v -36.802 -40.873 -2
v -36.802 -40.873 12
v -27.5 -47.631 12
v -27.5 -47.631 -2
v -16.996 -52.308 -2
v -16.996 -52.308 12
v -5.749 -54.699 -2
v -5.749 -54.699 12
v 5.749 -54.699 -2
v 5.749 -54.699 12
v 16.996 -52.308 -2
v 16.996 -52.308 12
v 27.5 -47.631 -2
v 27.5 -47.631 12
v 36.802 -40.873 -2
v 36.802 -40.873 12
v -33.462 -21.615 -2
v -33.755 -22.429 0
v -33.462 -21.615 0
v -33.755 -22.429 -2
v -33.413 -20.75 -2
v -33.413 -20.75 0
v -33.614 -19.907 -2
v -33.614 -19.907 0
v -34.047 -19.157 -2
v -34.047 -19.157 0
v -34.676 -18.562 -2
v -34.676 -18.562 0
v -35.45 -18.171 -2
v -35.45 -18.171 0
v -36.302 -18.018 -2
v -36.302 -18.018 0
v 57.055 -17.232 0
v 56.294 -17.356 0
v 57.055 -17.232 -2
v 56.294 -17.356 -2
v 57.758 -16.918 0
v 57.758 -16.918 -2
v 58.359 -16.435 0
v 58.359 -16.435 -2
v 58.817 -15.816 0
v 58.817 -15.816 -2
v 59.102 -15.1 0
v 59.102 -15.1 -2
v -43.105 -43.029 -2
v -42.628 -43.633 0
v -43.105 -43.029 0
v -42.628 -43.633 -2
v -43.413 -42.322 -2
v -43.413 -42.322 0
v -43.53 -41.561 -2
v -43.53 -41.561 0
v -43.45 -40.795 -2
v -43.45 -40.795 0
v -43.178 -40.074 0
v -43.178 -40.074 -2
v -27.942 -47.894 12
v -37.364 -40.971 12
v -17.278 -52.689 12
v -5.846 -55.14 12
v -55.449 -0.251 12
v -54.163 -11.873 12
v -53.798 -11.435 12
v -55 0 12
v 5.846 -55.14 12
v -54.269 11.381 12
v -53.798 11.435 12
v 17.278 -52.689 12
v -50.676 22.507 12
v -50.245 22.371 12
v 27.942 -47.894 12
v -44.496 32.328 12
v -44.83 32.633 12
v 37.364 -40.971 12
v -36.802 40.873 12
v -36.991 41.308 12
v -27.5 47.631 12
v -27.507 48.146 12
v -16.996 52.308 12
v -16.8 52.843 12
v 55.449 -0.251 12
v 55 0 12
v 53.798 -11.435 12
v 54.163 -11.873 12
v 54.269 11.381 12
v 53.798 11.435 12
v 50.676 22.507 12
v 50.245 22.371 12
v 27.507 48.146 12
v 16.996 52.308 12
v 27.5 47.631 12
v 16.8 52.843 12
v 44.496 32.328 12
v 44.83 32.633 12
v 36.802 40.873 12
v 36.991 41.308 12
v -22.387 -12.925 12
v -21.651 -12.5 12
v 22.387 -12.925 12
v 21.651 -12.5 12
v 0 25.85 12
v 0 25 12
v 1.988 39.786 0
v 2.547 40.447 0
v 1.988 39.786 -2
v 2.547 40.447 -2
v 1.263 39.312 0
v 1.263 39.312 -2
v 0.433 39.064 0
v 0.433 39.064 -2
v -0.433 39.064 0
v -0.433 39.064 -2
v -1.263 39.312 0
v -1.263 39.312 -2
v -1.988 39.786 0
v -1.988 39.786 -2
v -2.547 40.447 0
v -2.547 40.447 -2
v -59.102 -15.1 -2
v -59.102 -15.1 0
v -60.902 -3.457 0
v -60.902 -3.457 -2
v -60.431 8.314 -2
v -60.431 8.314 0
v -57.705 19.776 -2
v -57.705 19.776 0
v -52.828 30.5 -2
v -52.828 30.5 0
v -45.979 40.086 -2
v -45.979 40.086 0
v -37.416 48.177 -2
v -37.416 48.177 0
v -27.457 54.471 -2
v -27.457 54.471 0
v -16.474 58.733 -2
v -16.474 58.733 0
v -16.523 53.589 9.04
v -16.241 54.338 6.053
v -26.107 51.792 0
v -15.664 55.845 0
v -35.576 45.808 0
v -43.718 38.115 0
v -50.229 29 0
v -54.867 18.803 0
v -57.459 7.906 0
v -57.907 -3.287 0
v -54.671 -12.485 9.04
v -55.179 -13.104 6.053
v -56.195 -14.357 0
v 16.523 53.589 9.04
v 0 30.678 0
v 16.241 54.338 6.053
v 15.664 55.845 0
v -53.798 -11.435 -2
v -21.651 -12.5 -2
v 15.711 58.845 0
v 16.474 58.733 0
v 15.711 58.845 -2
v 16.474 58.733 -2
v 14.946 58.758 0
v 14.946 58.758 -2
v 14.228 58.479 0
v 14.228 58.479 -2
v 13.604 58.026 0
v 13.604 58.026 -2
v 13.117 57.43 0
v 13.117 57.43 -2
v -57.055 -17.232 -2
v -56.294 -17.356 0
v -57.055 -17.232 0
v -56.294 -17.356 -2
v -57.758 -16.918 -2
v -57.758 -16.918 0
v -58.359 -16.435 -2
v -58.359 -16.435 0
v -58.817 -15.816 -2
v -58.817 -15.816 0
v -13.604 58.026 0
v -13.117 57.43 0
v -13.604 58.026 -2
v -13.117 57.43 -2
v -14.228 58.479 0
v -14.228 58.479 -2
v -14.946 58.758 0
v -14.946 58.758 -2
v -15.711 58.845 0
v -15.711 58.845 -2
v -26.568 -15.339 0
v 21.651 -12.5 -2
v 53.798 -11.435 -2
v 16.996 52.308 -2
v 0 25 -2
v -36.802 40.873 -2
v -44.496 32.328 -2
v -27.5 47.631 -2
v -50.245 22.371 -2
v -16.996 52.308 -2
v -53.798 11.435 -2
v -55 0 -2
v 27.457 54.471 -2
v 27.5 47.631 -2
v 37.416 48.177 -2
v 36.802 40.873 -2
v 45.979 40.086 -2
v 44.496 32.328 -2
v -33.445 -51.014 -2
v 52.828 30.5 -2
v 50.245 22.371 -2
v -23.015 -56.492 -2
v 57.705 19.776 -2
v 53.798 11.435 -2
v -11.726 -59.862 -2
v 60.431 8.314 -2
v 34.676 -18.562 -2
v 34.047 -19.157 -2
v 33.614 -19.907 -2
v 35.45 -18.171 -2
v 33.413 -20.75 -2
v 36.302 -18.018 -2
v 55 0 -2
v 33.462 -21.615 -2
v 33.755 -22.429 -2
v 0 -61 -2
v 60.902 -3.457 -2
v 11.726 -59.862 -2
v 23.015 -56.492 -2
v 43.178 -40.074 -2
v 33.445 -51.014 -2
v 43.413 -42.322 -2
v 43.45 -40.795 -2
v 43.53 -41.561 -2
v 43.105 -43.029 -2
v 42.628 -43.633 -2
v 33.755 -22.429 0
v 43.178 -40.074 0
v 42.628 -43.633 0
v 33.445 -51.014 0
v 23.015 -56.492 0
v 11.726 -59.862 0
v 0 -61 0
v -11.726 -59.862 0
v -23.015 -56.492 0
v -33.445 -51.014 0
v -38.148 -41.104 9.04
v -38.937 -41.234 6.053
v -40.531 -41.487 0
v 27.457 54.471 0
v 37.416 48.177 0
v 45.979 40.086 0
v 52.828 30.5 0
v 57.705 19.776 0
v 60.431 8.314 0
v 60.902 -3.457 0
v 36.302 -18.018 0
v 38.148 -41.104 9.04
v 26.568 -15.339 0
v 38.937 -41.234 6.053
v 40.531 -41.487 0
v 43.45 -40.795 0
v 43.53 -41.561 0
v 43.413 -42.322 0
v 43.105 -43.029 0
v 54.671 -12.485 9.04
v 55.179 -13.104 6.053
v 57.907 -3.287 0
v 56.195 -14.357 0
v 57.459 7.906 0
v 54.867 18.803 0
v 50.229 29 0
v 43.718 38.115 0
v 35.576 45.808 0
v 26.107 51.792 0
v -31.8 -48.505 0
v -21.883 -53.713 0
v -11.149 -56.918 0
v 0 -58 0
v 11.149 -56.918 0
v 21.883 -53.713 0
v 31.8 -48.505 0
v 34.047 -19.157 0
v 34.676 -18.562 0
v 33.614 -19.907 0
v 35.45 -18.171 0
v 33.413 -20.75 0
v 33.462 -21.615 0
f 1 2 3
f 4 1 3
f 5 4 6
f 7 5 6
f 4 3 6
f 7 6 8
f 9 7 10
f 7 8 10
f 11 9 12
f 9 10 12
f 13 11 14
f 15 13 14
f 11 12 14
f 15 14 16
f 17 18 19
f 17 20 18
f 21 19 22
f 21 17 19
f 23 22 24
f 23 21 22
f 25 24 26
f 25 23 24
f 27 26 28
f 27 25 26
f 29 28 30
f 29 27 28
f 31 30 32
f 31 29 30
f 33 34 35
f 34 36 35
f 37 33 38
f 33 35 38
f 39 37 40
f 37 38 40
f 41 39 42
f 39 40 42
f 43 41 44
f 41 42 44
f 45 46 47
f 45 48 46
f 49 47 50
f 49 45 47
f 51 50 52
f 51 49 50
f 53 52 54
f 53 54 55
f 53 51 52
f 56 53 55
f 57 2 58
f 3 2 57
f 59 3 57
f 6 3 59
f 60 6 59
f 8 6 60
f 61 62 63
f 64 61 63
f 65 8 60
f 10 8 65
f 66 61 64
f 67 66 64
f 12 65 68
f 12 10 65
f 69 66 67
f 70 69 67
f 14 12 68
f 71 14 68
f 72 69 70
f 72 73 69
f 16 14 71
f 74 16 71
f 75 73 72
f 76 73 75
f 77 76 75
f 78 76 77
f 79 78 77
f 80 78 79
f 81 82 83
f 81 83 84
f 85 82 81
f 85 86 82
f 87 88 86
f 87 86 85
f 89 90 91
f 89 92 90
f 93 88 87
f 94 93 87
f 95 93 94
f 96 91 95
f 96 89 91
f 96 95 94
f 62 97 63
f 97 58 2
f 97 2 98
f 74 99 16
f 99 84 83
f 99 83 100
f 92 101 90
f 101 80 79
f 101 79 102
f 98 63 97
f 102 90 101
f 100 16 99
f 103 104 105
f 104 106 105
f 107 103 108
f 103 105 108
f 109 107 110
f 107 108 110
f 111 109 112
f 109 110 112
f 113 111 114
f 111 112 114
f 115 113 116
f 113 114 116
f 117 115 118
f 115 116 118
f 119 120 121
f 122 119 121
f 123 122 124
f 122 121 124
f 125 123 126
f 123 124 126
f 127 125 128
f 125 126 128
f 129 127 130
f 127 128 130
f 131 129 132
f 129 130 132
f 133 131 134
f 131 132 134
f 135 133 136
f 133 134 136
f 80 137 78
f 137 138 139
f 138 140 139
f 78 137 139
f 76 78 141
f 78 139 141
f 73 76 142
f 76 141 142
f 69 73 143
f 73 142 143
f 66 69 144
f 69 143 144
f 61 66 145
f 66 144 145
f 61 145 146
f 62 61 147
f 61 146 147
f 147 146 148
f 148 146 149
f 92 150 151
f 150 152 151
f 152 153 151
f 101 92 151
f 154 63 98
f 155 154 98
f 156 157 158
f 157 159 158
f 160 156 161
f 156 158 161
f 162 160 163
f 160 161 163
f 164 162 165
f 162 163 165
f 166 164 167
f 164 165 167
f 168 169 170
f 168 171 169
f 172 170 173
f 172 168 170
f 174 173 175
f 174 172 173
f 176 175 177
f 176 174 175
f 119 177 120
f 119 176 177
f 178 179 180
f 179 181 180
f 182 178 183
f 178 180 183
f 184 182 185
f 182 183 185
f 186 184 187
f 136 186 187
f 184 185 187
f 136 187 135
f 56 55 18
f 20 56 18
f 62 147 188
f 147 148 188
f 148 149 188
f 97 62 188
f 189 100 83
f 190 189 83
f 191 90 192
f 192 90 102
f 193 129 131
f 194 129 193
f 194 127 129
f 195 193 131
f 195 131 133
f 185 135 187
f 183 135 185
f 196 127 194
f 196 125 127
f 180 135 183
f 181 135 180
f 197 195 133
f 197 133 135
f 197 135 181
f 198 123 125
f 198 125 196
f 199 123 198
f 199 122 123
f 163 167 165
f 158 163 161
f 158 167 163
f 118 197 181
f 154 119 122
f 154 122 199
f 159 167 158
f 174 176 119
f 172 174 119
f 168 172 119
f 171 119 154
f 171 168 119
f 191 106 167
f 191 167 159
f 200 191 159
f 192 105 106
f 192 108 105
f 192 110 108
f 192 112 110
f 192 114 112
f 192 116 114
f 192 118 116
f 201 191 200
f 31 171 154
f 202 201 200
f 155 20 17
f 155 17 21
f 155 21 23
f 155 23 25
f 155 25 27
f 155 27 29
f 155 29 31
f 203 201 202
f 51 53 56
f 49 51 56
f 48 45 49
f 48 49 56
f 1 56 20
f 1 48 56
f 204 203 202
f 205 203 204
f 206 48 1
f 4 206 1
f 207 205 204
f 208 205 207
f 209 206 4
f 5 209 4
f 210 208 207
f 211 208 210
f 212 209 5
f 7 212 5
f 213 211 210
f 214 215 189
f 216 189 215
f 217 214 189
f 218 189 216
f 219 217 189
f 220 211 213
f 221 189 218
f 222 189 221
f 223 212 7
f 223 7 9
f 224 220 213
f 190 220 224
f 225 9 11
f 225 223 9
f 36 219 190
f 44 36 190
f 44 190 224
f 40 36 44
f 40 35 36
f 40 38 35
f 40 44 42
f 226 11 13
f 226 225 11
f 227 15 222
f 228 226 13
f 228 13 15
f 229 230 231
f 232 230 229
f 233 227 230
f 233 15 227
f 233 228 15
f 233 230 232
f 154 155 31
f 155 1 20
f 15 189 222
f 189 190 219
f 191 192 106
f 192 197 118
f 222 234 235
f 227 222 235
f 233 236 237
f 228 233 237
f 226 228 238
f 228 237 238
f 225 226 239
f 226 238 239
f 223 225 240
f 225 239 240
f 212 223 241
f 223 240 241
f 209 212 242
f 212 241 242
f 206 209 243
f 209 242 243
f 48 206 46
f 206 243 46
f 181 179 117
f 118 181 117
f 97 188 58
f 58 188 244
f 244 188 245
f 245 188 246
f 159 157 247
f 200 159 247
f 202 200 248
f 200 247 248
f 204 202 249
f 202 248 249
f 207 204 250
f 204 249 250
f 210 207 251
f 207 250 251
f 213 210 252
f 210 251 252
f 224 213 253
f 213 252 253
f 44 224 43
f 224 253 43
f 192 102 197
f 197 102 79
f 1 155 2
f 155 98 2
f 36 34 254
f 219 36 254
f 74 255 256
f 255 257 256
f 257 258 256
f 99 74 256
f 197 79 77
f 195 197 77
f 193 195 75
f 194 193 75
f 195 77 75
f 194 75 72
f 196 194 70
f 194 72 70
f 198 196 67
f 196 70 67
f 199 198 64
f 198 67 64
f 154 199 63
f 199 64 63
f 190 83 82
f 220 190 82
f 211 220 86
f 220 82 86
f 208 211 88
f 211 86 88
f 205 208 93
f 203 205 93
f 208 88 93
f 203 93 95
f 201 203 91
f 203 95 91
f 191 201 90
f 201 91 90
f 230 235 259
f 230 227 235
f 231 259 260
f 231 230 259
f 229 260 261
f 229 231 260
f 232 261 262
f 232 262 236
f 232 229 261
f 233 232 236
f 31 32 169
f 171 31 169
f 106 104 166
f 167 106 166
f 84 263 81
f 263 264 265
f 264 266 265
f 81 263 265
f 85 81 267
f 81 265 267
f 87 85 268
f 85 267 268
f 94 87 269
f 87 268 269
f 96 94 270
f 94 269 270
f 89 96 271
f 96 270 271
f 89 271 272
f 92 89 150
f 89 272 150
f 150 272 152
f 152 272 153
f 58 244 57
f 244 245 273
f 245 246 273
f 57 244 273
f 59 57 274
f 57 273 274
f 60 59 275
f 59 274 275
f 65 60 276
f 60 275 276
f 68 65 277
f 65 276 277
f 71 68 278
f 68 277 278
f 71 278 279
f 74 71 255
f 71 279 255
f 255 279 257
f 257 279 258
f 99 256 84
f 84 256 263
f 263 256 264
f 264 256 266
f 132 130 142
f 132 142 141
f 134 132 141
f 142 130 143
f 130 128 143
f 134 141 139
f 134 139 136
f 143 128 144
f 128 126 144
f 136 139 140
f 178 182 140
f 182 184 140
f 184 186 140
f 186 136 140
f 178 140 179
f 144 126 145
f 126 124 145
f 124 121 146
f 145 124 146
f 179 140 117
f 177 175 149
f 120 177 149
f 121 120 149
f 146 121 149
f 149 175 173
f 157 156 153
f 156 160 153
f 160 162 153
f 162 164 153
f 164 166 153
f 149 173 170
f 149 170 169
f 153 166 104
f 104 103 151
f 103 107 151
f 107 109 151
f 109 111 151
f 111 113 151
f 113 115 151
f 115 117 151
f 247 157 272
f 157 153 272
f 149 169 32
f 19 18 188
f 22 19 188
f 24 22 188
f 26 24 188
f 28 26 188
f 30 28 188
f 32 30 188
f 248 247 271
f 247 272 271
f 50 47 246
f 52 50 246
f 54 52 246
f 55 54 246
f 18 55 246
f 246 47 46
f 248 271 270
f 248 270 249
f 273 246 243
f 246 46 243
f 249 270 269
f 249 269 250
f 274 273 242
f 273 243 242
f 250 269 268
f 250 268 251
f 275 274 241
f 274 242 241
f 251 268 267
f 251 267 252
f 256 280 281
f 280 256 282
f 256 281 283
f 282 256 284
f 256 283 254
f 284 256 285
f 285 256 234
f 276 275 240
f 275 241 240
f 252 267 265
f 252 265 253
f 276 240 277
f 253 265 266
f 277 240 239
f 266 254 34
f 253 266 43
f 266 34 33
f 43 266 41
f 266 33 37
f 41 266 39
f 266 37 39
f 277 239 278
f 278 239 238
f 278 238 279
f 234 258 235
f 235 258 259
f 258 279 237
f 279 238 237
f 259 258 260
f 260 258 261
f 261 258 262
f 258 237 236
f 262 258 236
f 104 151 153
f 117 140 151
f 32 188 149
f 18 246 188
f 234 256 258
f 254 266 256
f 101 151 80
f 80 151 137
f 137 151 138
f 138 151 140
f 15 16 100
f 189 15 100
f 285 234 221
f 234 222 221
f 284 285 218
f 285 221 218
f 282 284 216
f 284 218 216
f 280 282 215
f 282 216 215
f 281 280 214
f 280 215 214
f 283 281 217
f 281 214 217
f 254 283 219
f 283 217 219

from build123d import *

# Parameters (mm, degrees)
F1_DEPTH = 12
F3_DEPTH = 2
F4_SIZE2 = 11.99999
F4_SIZE  = 2.550669
F5_R     = 3


# Not quite as in the source:
# - a fillet or chamfer is up to 0.001 mm smaller than in the source, because OpenCascade refuses the exact size


with BuildPart() as f1:
    # F0 (on Top) → F1 (new body)
    with BuildSketch(Plane.XY):
        with BuildLine():
            Line((15.6635716436, 55.8448970217), (0, 30.6775543541))
            Line((0, 30.6775543541), (-15.6635716436, 55.8448970217))
            ThreePointArc((-15.6635716436, 55.8448970217), (-50.2294734195, 29), (-56.1948853143, -14.3573975535))
            Line((-56.1948853143, -14.3573975535), (-26.5675413967, -15.3387771771))
            Line((-26.5675413967, -15.3387771771), (-40.5313136707, -41.4874994682))
            ThreePointArc((-40.5313136707, -41.4874994682), (0, -58), (40.5313136707, -41.4874994682))
            Line((40.5313136707, -41.4874994682), (26.5675413967, -15.3387771771))
            Line((26.5675413967, -15.3387771771), (56.1948853143, -14.3573975535))
            ThreePointArc((56.1948853143, -14.3573975535), (50.2294734195, 29), (15.6635716436, 55.8448970217))
        make_face()
        with BuildLine():
            ThreePointArc((-53.7981180404, -11.435142995), (-47.6313972081, 27.5), (-16.9959346906, 52.3081083962))
            Line((-16.9959346906, 52.3081083962), (0, 25))
            Line((0, 25), (16.9959346906, 52.3081083962))
            ThreePointArc((16.9959346906, 52.3081083962), (47.6313972081, 27.5), (53.7981180404, -11.435142995))
            Line((53.7981180404, -11.435142995), (21.6506350946, -12.5))
            Line((21.6506350946, -12.5), (36.8021833497, -40.8729654013))
            ThreePointArc((36.8021833497, -40.8729654013), (0, -55), (-36.8021833497, -40.8729654013))
            Line((-36.8021833497, -40.8729654013), (-21.6506350946, -12.5))
            Line((-21.6506350946, -12.5), (-53.7981180404, -11.435142995))
        make_face(mode=Mode.SUBTRACT)
    extrude(amount=F1_DEPTH)

    # F2 (on face) → F3 (join)
    with BuildSketch(Plane(origin=(0, 0, 0), x_dir=(1, 0, 0), z_dir=(0, 0, -1))):
        with BuildLine():
            Line((31.4844476987, 18.1775543541), (44.2174856505, 42.0215892459))
            ThreePointArc((44.2174856505, 42.0215892459), (0, 61), (-44.2174856505, 42.0215892459))
            Line((-44.2174856505, 42.0215892459), (-31.4844476987, 18.1775543541))
            Line((-31.4844476987, 18.1775543541), (-58.5005066196, 17.2826712419))
            ThreePointArc((-58.5005066196, 17.2826712419), (-52.8275496309, -30.5), (-14.2830209691, -59.3042604877))
            Line((-14.2830209691, -59.3042604877), (0, -36.3551087083))
            Line((0, -36.3551087083), (14.2830209691, -59.3042604877))
            ThreePointArc((14.2830209691, -59.3042604877), (52.8275496309, -30.5), (58.5005066196, 17.2826712419))
            Line((58.5005066196, 17.2826712419), (31.4844476987, 18.1775543541))
        make_face()
        with BuildLine():
            Line((-21.6506350946, 12.5), (-36.8021833497, 40.8729654013))
            ThreePointArc((-36.8021833497, 40.8729654013), (0, 55), (36.8021833497, 40.8729654013))
            Line((36.8021833497, 40.8729654013), (21.6506350946, 12.5))
            Line((21.6506350946, 12.5), (53.7981180404, 11.435142995))
            ThreePointArc((53.7981180404, 11.435142995), (47.6313972081, -27.5), (16.9959346906, -52.3081083962))
            Line((16.9959346906, -52.3081083962), (0, -25))
            Line((0, -25), (-16.9959346906, -52.3081083962))
            ThreePointArc((-16.9959346906, -52.3081083962), (-47.6313972081, -27.5), (-53.7981180404, 11.435142995))
            Line((-53.7981180404, 11.435142995), (-21.6506350946, 12.5))
        make_face(mode=Mode.SUBTRACT)
    extrude(amount=F3_DEPTH)

    # F4 (size 2.55067874 and 12 in the source; OpenCascade refuses exactly that, so slightly less here)
    f4_edges = [f1.edges().sort_by_distance(p)[0] for p in [
        (-41.381213, -14.848087, 12),
        (-33.549428, -28.413138, 12),
        (0, -58, 12),
        (-50.229473, 29, 12),
        (-7.831786, 43.261226, 12),
        (7.831786, 43.261226, 12),
        (50.229473, 29, 12),
        (41.381213, -14.848087, 12),
        (33.549428, -28.413138, 12),
    ]]
    f4_side = f1.faces().sort_by_distance((0, -56.37468, 12))[0]
    chamfer(f4_edges, length=F4_SIZE, length2=F4_SIZE2, reference=f4_side)

    # F5
    f5_edges = [f1.edges().sort_by_distance(p)[0] for p in [
        (-58.500507, -17.282671, -1),
        (-31.484448, -18.177554, -1),
        (-44.217486, -42.021589, -1),
        (44.217486, -42.021589, -1),
        (31.484448, -18.177554, -1),
        (58.500507, -17.282671, -1),
        (14.283021, 59.30426, -1),
        (0, 36.355109, -1),
        (-14.283021, 59.30426, -1),
    ]]
    fillet(f5_edges, radius=F5_R)


solid = f1.part
